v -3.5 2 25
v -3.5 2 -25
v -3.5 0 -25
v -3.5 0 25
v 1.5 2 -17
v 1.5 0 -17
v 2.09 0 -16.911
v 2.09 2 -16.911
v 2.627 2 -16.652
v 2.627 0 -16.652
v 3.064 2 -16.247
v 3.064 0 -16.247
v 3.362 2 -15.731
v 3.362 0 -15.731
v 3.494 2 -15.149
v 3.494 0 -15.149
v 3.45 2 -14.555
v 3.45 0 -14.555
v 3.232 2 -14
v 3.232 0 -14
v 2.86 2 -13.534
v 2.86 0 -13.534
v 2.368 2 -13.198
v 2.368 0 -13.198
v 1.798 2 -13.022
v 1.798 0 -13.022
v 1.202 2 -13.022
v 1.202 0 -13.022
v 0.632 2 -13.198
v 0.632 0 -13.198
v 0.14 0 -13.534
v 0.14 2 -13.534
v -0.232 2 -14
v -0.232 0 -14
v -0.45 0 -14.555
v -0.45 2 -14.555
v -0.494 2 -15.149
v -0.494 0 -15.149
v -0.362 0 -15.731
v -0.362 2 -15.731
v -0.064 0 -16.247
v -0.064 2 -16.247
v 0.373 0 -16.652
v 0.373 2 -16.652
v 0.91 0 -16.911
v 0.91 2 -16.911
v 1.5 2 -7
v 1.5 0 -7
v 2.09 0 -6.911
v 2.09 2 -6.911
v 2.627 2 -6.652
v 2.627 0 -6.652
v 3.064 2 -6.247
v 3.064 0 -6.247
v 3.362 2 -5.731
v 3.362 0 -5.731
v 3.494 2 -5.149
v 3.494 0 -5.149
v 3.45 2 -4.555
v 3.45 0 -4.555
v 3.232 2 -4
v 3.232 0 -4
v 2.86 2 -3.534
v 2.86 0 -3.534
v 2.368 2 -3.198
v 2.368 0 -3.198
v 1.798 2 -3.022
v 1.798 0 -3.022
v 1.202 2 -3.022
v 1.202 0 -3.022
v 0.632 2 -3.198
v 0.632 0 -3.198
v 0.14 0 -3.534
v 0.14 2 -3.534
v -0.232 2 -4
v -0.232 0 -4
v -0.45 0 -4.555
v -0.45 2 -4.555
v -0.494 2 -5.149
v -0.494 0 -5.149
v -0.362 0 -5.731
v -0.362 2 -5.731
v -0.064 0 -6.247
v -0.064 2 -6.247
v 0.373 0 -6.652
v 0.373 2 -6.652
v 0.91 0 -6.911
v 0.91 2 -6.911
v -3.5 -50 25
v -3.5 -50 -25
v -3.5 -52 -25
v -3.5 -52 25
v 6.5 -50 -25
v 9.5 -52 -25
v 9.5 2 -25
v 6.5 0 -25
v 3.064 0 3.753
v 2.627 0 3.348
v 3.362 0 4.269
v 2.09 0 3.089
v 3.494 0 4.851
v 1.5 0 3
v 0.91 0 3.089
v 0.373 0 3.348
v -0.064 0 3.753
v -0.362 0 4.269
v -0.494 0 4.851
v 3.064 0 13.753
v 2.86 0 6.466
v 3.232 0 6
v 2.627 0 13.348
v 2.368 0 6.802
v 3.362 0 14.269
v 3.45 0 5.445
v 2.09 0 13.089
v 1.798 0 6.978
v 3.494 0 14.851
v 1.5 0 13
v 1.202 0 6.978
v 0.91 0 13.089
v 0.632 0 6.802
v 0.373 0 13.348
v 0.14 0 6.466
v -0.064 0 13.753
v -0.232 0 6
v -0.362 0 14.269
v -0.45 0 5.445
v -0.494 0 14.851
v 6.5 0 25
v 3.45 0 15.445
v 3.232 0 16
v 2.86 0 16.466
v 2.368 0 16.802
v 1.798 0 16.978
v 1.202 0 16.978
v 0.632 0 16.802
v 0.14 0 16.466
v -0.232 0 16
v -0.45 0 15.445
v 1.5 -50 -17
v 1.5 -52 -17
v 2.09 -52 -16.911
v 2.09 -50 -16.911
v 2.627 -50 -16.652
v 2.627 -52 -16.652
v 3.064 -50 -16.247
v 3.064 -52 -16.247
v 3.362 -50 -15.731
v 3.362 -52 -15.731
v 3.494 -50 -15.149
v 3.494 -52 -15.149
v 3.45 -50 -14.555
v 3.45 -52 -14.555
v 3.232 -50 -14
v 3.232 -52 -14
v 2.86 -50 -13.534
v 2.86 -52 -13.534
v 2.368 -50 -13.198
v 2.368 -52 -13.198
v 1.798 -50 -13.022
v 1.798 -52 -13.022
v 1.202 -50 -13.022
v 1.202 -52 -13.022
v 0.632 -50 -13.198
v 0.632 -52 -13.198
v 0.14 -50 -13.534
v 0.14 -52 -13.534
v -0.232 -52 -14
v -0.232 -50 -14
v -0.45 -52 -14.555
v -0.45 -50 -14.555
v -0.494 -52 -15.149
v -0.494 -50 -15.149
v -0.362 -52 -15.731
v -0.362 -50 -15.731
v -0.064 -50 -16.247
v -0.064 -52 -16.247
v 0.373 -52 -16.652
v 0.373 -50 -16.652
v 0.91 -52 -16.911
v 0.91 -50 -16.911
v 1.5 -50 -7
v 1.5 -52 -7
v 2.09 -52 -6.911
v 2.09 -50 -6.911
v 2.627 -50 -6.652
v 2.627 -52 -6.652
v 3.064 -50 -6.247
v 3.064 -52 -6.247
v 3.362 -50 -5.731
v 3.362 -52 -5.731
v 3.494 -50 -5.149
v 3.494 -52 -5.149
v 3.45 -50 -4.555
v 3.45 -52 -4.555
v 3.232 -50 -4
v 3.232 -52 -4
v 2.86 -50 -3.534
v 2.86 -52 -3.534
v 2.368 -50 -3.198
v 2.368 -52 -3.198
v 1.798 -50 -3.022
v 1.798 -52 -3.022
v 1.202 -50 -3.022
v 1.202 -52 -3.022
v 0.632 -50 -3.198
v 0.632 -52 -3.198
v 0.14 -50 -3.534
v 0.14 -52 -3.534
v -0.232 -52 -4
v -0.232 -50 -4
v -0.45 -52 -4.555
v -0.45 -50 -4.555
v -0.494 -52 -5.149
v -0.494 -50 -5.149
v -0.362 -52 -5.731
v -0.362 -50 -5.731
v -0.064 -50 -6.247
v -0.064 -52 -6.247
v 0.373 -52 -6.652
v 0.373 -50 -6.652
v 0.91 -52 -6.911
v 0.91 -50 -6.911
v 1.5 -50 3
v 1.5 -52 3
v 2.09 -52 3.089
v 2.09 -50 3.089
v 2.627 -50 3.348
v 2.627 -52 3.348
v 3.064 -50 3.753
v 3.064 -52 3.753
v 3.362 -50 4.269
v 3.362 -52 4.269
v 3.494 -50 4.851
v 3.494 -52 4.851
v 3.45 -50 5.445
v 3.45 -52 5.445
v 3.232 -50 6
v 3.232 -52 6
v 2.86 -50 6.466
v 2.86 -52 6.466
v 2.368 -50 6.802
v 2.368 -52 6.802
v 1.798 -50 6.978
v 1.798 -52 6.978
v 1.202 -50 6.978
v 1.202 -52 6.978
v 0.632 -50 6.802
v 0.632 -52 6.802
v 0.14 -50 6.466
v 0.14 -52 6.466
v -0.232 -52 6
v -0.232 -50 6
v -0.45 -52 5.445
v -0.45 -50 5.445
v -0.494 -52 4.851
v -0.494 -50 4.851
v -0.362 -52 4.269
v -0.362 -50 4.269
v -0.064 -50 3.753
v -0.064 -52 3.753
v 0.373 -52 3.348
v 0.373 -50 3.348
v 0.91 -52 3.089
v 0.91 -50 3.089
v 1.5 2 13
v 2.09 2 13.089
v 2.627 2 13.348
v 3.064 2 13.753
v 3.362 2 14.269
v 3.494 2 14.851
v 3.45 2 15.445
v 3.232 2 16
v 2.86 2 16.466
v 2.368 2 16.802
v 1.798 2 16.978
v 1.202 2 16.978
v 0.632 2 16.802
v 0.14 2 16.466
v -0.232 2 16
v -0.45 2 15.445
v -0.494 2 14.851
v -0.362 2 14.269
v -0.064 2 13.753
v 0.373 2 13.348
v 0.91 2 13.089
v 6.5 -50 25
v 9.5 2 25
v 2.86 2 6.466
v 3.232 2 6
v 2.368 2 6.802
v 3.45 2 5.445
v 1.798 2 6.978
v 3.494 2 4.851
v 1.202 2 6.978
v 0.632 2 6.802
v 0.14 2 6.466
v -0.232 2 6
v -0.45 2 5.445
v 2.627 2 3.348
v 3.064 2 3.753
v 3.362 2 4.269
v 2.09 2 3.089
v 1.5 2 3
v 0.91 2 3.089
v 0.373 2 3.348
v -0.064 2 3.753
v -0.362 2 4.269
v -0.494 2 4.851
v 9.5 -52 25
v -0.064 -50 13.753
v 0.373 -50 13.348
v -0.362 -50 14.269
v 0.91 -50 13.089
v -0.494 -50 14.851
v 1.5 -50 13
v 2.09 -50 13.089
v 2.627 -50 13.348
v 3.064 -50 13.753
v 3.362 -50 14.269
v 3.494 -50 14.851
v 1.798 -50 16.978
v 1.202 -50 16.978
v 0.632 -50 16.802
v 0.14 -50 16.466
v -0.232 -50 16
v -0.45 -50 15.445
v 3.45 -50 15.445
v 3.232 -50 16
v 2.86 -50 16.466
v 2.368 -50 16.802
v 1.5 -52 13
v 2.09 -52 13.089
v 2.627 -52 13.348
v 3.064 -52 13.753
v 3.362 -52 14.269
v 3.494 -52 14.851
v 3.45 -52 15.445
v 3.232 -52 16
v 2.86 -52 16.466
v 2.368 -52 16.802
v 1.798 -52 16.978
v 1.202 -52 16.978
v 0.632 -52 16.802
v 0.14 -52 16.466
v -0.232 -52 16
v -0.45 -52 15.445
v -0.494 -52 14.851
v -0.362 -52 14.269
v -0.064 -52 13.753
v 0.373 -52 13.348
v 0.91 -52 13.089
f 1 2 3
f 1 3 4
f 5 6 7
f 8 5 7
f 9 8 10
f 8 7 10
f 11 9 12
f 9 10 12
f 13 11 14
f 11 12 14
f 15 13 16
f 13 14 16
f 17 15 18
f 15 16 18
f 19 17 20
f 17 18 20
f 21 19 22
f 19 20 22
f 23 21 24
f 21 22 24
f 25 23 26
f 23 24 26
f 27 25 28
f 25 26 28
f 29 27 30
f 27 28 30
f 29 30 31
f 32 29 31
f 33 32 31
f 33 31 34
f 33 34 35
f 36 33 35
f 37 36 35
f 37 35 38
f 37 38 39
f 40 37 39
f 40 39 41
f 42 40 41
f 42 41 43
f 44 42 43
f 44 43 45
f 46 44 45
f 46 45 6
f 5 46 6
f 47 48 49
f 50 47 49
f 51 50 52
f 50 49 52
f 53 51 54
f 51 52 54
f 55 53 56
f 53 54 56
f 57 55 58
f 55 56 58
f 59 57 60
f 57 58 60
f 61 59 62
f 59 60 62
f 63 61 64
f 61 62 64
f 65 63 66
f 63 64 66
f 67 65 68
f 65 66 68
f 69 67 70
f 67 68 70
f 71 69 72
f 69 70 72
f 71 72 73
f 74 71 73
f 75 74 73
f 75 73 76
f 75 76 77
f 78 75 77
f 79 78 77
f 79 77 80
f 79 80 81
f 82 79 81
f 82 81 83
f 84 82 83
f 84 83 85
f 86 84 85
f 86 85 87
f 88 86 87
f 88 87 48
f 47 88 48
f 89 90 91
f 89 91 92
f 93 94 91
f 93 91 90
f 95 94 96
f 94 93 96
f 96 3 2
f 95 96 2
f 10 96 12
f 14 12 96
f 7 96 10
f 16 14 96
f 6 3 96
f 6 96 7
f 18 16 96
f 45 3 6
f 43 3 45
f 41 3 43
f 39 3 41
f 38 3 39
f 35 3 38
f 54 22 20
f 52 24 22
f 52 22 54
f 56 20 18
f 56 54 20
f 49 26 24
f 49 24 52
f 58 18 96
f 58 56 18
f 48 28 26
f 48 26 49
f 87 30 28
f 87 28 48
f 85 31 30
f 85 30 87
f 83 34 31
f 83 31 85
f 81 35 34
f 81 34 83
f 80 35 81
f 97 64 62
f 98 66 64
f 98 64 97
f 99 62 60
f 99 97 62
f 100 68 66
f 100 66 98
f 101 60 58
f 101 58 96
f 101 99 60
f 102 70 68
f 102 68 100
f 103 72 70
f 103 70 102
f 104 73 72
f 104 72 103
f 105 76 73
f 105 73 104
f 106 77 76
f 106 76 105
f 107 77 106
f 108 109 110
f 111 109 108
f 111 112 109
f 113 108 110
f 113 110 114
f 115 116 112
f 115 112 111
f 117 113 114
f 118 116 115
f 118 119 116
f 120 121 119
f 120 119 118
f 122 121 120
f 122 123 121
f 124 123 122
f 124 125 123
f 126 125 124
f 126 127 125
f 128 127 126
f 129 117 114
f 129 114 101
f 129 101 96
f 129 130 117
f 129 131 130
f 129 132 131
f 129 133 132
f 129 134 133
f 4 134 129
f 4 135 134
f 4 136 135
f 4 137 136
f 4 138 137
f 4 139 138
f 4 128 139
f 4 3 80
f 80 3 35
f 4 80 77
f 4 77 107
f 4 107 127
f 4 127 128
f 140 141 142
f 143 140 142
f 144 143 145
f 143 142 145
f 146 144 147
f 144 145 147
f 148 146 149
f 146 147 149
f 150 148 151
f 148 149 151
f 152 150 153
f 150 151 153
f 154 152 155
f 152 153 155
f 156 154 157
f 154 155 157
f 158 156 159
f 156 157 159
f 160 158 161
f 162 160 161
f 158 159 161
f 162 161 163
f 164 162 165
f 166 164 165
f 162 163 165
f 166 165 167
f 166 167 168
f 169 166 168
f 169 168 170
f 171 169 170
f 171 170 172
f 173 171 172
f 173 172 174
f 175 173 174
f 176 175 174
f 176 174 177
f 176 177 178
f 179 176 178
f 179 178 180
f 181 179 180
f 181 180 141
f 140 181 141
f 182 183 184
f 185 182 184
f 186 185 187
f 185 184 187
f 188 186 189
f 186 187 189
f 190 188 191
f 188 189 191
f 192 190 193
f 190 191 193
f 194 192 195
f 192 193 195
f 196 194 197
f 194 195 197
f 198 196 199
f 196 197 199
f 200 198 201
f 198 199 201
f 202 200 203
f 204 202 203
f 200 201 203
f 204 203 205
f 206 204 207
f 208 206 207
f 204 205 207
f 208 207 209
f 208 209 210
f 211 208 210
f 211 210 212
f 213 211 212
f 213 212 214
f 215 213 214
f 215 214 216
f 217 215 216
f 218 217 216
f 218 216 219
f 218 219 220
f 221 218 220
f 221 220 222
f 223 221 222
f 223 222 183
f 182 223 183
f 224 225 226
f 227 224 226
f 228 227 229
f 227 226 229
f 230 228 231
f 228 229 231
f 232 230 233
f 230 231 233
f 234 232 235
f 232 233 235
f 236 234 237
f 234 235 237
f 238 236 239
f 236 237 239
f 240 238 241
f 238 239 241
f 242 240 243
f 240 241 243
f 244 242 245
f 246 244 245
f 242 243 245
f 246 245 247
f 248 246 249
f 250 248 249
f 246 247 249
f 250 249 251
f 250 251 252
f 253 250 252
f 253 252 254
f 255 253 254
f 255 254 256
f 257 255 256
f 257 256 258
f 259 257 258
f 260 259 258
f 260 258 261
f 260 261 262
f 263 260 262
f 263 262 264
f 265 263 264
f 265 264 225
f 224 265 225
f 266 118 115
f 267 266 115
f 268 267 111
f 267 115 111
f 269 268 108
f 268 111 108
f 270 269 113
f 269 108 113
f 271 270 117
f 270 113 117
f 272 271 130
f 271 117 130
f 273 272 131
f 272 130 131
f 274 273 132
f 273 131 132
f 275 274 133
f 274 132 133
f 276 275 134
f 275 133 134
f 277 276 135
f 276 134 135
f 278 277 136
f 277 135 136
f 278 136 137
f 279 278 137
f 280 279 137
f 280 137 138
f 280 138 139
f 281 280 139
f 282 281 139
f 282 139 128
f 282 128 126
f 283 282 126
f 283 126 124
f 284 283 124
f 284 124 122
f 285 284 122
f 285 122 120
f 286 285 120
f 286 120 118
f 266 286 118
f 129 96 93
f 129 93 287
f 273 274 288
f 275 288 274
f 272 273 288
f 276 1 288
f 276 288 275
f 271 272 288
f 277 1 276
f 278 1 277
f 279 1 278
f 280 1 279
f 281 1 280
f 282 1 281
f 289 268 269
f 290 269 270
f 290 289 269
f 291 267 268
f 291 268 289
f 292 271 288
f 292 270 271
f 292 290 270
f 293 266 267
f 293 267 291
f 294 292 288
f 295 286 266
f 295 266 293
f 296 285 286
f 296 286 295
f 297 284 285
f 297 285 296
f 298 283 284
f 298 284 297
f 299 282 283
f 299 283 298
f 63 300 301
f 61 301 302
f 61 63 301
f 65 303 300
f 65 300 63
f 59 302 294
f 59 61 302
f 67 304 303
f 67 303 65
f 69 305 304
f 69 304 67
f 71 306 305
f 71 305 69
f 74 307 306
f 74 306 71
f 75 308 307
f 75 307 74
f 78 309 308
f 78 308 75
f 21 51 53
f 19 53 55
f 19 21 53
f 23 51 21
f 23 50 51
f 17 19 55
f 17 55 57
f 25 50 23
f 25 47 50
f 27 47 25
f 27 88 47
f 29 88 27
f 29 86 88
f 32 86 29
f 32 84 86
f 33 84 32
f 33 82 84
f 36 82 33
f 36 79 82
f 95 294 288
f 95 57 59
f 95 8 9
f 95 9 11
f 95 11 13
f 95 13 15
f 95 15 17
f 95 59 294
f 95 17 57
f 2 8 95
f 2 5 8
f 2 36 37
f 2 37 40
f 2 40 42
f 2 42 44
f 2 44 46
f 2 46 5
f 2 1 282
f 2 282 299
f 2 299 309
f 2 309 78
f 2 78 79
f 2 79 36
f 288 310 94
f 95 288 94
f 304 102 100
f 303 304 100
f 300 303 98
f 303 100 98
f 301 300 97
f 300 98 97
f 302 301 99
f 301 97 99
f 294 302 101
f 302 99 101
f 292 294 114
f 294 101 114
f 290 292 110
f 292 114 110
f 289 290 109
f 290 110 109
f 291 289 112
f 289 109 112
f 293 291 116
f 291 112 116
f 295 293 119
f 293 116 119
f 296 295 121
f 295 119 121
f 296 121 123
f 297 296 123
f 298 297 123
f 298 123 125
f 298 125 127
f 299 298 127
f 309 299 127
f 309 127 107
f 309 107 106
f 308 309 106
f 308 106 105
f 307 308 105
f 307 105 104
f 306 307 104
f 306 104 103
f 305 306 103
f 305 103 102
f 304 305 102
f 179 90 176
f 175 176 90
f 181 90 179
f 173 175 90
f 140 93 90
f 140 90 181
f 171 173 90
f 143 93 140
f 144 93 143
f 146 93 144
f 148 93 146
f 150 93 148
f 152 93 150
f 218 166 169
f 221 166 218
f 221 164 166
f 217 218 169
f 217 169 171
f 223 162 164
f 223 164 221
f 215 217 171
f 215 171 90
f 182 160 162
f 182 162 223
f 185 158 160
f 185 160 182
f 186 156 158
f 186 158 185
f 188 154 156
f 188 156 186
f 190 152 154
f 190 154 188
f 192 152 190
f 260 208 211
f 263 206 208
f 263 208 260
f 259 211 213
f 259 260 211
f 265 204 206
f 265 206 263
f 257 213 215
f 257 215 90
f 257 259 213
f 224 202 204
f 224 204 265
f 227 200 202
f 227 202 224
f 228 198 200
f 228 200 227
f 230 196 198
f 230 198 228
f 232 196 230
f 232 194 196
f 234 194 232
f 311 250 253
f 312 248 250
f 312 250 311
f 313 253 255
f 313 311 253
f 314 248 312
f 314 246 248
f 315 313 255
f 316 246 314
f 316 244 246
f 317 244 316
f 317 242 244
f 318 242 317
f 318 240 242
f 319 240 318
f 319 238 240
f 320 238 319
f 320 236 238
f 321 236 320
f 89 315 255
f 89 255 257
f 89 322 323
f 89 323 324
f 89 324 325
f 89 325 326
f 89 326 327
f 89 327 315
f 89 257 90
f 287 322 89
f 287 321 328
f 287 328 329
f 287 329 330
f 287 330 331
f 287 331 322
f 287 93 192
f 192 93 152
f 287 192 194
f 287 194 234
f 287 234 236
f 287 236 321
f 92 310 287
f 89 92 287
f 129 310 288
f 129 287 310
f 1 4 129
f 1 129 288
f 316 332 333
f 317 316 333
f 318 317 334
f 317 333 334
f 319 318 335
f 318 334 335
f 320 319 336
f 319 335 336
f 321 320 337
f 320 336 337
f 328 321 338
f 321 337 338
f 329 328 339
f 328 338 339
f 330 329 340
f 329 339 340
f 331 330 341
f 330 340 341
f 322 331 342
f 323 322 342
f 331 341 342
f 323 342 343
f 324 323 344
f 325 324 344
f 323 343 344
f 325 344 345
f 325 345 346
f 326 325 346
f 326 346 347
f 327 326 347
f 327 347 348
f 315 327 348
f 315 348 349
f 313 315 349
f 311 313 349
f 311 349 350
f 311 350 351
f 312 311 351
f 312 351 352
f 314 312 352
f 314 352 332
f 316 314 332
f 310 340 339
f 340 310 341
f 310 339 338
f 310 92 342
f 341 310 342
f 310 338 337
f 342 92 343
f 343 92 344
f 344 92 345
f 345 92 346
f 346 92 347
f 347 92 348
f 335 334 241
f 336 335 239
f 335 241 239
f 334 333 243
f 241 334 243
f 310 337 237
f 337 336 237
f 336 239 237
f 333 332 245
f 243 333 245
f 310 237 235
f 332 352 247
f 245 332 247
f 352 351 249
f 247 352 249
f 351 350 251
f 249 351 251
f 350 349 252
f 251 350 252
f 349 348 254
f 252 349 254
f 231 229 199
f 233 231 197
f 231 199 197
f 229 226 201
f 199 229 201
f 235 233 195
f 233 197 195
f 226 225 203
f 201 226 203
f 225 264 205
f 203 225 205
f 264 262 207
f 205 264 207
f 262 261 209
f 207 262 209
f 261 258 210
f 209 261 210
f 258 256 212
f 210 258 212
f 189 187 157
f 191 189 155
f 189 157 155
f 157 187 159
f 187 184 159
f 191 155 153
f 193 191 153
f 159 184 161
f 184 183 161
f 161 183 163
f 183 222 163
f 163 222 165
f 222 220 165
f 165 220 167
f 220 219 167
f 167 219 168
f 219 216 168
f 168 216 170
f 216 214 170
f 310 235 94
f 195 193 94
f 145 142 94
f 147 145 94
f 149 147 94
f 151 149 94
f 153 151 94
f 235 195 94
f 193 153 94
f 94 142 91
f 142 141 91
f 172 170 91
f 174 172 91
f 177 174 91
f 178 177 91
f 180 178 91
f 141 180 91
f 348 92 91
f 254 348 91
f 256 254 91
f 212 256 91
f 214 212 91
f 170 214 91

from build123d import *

# Parameters (mm, degrees)
SKETCH_1_W          = 10
SKETCH_1_H          = 50
EXTRUDE_1_DEPTH     = 2
SKETCH_2_W          = 50
SKETCH_2_H          = 2
EXTRUDE_2_DEPTH     = 3
SKETCH_3_W          = 3
SKETCH_3_H          = 50
EXTRUDE_3_DEPTH     = 52
SKETCH_4_W          = 50
SKETCH_4_H          = 2
EXTRUDE_4_DEPTH     = 10
SKETCH_5_R          = 2
CUT_EXTRUDE_1_DEPTH = 61.041652209
SKETCH_6_W          = 50
SKETCH_6_H          = 54
EXTRUDE_5_DEPTH     = 1.5
SKETCH_7_W          = 50
SKETCH_7_H          = 50
CUT_EXTRUDE_2_DEPTH = 1.5
SKETCH_8_W          = 50
SKETCH_8_H          = 2
CUT_EXTRUDE_3_DEPTH = 1.5


with BuildPart() as part:
    # 草图1 → 凸台-拉伸1 (new body)
    with BuildSketch(Plane(origin=(0, 0, 0), x_dir=(1, 0, 0), z_dir=(0, 1, 0))):
        Rectangle(SKETCH_1_W, SKETCH_1_H)
    extrude(amount=EXTRUDE_1_DEPTH)

    # 草图2 → 凸台-拉伸2 (add)
    with BuildSketch(Plane(origin=(5, 0, 0), x_dir=(0, 0, -1), z_dir=(1, 0, 0))):
        with Locations((0, 1)):
            Rectangle(SKETCH_2_W, SKETCH_2_H)
    extrude(amount=EXTRUDE_2_DEPTH)

    # 草图3 → 凸台-拉伸3 (add)
    with BuildSketch(Plane.XZ):
        with Locations((6.5, 0)):
            Rectangle(SKETCH_3_W, SKETCH_3_H)
    extrude(amount=EXTRUDE_3_DEPTH)

    # 草图4 → 凸台-拉伸4 (add)
    with BuildSketch(Plane.ZY.offset(-5)):
        with Locations((0, -51)):
            Rectangle(SKETCH_4_W, SKETCH_4_H)
    extrude(amount=EXTRUDE_4_DEPTH)

    # 草图5 → 切除-拉伸1 (cut, through all)
    with BuildSketch(Plane(origin=(0, -52, 0), x_dir=(-1, 0, 0), z_dir=(0, -1, 0))):
        with Locations(Location((-1.5, -15, 0), (0, 0, 90))):
            Circle(SKETCH_5_R)
        with Locations(Location((-1.5, -5, 0), (0, 0, 90))):
            Circle(SKETCH_5_R)
        with Locations(Location((-1.5, 5, 0), (0, 0, 90))):
            Circle(SKETCH_5_R)
        with Locations(Location((-1.5, 15, 0), (0, 0, 90))):
            Circle(SKETCH_5_R)
    extrude(amount=-CUT_EXTRUDE_1_DEPTH, mode=Mode.SUBTRACT)

    # 草图6 → 凸台-拉伸5 (add)
    with BuildSketch(Plane(origin=(8, 0, 0), x_dir=(0, 0, -1), z_dir=(1, 0, 0))):
        with Locations((0, -25)):
            Rectangle(SKETCH_6_W, SKETCH_6_H)
    extrude(amount=EXTRUDE_5_DEPTH)

    # 草图7 → 切除-拉伸2 (cut)
    with BuildSketch(Plane.ZY.offset(-5)):
        with Locations((0, -25)):
            Rectangle(SKETCH_7_W, SKETCH_7_H)
    extrude(amount=-CUT_EXTRUDE_2_DEPTH, mode=Mode.SUBTRACT)

    # 草图8 → 切除-拉伸3 (cut)
    with BuildSketch(Plane.ZY.offset(5)):
        with Locations((0, -51)):
            Rectangle(SKETCH_8_W, SKETCH_8_H)
        with Locations((0, 1)):
            Rectangle(SKETCH_8_W, SKETCH_8_H)
    extrude(amount=-CUT_EXTRUDE_3_DEPTH, mode=Mode.SUBTRACT)


solid = part.part
